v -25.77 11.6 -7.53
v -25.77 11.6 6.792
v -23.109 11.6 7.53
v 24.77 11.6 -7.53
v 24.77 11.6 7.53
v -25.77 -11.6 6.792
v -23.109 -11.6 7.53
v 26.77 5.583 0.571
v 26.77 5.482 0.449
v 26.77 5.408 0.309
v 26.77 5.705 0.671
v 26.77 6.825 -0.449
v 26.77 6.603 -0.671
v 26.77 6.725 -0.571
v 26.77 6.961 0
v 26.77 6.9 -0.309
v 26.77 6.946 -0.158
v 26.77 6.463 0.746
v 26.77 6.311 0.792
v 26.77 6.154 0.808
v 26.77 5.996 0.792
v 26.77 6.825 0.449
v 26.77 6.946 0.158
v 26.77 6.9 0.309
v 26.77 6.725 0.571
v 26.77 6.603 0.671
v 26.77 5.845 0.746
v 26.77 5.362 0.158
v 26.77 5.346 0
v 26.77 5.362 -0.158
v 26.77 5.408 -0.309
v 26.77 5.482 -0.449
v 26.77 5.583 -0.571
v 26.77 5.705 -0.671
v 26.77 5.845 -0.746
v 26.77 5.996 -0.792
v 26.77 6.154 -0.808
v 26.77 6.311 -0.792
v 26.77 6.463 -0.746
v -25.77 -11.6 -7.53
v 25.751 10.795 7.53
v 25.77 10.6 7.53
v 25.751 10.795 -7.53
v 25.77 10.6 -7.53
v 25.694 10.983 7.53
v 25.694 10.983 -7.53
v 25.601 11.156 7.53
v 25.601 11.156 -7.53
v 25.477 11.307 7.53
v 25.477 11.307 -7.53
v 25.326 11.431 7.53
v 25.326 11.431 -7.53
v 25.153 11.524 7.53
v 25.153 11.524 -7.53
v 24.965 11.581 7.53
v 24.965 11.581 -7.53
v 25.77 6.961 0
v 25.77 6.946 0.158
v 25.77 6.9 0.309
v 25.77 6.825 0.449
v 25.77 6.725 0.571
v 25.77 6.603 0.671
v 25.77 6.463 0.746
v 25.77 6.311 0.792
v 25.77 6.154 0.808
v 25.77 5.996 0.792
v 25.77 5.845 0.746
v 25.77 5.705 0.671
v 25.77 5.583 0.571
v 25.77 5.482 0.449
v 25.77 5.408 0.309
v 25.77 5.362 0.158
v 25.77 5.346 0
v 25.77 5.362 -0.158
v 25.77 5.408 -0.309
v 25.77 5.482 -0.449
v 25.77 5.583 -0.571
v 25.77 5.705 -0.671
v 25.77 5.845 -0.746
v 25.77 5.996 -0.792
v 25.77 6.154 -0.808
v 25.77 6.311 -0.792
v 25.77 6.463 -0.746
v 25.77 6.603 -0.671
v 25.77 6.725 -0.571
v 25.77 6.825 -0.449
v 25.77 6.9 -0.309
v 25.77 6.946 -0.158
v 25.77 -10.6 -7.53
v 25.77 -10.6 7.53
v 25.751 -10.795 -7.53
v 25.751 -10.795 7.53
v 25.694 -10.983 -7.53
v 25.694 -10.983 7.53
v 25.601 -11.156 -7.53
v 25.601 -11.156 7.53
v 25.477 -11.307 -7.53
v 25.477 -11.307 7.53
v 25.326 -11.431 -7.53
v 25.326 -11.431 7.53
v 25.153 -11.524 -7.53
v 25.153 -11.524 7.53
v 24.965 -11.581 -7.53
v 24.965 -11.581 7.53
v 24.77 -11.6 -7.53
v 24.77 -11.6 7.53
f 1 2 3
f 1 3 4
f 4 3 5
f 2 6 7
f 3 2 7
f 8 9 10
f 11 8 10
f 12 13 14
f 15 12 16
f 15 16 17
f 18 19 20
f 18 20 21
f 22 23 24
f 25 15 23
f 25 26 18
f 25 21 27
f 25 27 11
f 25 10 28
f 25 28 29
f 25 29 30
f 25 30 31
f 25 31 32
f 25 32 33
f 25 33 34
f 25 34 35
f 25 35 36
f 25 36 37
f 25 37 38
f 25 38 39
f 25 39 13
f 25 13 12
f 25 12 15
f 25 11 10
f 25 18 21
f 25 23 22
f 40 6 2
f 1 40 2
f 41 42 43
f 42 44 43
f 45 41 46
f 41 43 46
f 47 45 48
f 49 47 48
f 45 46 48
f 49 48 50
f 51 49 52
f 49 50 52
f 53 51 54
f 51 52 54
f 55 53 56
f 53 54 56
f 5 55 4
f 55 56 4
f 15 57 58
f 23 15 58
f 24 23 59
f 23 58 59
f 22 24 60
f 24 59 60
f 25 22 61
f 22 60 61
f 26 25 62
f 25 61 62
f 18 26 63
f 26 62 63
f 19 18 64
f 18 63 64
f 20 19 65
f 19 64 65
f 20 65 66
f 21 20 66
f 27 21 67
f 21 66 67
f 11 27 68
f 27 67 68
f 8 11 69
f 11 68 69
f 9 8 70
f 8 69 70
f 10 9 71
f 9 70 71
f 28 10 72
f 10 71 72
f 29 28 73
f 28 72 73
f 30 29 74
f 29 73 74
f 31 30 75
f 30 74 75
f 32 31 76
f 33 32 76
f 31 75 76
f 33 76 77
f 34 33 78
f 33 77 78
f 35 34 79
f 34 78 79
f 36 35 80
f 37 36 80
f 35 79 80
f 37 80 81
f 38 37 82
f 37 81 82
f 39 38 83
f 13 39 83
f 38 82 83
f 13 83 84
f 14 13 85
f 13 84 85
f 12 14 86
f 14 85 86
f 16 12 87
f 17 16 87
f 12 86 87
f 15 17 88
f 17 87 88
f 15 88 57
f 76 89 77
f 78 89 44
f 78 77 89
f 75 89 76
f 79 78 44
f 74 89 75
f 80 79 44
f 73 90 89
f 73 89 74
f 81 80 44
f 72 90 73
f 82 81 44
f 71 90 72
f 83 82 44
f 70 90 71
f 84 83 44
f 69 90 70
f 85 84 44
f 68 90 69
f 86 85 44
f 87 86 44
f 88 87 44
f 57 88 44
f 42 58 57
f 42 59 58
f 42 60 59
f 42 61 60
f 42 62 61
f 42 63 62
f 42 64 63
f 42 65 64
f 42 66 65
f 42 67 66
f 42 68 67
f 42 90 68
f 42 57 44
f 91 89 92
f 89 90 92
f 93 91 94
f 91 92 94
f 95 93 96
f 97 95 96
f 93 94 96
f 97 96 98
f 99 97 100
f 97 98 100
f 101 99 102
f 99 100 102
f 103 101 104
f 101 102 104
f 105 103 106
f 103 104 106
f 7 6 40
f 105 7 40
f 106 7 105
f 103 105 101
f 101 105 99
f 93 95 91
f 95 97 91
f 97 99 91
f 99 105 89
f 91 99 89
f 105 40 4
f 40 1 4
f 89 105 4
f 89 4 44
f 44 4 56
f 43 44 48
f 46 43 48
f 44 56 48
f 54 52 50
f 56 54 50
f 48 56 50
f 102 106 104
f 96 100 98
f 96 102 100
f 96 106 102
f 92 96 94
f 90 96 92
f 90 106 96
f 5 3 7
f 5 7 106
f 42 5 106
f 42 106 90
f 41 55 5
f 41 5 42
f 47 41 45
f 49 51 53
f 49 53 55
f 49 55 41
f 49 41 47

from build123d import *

# Parameters (mm, degrees)
F0_W     = 51.54
F0_H     = 23.2
F1_DEPTH = 7.53
F2_R     = 1
F3_R     = 0.8075065721
F4_DEPTH = 1
F6_DEPTH = 23.2


with BuildPart() as f1:
    # F0 (on Top) → F1 (new body, symmetric)
    with BuildSketch(Plane.XY):
        Rectangle(F0_W, F0_H)
    extrude(amount=F1_DEPTH, both=True)

    # F2
    f2_edges = [f1.edges().sort_by_distance(p)[0] for p in [
        (25.77, 11.6, 0),
        (25.77, -11.6, 0),
    ]]
    fillet(f2_edges, radius=F2_R)

    # F3 (on face) → F4 (join)
    with BuildSketch(Plane.YZ.offset(25.77)):
        with Locations((6.1538815498, 0)):
            Circle(F3_R)
    extrude(amount=F4_DEPTH)

    # F5 (on face) → F6 (cut, through all)
    with BuildSketch(Plane.XZ.offset(11.6)):
        Polygon((-25.77, 7.53), (-25.77, 6.7921262234), (-23.1085941195, 7.53), align=None)
    extrude(amount=-F6_DEPTH, mode=Mode.SUBTRACT)


solid = f1.part
